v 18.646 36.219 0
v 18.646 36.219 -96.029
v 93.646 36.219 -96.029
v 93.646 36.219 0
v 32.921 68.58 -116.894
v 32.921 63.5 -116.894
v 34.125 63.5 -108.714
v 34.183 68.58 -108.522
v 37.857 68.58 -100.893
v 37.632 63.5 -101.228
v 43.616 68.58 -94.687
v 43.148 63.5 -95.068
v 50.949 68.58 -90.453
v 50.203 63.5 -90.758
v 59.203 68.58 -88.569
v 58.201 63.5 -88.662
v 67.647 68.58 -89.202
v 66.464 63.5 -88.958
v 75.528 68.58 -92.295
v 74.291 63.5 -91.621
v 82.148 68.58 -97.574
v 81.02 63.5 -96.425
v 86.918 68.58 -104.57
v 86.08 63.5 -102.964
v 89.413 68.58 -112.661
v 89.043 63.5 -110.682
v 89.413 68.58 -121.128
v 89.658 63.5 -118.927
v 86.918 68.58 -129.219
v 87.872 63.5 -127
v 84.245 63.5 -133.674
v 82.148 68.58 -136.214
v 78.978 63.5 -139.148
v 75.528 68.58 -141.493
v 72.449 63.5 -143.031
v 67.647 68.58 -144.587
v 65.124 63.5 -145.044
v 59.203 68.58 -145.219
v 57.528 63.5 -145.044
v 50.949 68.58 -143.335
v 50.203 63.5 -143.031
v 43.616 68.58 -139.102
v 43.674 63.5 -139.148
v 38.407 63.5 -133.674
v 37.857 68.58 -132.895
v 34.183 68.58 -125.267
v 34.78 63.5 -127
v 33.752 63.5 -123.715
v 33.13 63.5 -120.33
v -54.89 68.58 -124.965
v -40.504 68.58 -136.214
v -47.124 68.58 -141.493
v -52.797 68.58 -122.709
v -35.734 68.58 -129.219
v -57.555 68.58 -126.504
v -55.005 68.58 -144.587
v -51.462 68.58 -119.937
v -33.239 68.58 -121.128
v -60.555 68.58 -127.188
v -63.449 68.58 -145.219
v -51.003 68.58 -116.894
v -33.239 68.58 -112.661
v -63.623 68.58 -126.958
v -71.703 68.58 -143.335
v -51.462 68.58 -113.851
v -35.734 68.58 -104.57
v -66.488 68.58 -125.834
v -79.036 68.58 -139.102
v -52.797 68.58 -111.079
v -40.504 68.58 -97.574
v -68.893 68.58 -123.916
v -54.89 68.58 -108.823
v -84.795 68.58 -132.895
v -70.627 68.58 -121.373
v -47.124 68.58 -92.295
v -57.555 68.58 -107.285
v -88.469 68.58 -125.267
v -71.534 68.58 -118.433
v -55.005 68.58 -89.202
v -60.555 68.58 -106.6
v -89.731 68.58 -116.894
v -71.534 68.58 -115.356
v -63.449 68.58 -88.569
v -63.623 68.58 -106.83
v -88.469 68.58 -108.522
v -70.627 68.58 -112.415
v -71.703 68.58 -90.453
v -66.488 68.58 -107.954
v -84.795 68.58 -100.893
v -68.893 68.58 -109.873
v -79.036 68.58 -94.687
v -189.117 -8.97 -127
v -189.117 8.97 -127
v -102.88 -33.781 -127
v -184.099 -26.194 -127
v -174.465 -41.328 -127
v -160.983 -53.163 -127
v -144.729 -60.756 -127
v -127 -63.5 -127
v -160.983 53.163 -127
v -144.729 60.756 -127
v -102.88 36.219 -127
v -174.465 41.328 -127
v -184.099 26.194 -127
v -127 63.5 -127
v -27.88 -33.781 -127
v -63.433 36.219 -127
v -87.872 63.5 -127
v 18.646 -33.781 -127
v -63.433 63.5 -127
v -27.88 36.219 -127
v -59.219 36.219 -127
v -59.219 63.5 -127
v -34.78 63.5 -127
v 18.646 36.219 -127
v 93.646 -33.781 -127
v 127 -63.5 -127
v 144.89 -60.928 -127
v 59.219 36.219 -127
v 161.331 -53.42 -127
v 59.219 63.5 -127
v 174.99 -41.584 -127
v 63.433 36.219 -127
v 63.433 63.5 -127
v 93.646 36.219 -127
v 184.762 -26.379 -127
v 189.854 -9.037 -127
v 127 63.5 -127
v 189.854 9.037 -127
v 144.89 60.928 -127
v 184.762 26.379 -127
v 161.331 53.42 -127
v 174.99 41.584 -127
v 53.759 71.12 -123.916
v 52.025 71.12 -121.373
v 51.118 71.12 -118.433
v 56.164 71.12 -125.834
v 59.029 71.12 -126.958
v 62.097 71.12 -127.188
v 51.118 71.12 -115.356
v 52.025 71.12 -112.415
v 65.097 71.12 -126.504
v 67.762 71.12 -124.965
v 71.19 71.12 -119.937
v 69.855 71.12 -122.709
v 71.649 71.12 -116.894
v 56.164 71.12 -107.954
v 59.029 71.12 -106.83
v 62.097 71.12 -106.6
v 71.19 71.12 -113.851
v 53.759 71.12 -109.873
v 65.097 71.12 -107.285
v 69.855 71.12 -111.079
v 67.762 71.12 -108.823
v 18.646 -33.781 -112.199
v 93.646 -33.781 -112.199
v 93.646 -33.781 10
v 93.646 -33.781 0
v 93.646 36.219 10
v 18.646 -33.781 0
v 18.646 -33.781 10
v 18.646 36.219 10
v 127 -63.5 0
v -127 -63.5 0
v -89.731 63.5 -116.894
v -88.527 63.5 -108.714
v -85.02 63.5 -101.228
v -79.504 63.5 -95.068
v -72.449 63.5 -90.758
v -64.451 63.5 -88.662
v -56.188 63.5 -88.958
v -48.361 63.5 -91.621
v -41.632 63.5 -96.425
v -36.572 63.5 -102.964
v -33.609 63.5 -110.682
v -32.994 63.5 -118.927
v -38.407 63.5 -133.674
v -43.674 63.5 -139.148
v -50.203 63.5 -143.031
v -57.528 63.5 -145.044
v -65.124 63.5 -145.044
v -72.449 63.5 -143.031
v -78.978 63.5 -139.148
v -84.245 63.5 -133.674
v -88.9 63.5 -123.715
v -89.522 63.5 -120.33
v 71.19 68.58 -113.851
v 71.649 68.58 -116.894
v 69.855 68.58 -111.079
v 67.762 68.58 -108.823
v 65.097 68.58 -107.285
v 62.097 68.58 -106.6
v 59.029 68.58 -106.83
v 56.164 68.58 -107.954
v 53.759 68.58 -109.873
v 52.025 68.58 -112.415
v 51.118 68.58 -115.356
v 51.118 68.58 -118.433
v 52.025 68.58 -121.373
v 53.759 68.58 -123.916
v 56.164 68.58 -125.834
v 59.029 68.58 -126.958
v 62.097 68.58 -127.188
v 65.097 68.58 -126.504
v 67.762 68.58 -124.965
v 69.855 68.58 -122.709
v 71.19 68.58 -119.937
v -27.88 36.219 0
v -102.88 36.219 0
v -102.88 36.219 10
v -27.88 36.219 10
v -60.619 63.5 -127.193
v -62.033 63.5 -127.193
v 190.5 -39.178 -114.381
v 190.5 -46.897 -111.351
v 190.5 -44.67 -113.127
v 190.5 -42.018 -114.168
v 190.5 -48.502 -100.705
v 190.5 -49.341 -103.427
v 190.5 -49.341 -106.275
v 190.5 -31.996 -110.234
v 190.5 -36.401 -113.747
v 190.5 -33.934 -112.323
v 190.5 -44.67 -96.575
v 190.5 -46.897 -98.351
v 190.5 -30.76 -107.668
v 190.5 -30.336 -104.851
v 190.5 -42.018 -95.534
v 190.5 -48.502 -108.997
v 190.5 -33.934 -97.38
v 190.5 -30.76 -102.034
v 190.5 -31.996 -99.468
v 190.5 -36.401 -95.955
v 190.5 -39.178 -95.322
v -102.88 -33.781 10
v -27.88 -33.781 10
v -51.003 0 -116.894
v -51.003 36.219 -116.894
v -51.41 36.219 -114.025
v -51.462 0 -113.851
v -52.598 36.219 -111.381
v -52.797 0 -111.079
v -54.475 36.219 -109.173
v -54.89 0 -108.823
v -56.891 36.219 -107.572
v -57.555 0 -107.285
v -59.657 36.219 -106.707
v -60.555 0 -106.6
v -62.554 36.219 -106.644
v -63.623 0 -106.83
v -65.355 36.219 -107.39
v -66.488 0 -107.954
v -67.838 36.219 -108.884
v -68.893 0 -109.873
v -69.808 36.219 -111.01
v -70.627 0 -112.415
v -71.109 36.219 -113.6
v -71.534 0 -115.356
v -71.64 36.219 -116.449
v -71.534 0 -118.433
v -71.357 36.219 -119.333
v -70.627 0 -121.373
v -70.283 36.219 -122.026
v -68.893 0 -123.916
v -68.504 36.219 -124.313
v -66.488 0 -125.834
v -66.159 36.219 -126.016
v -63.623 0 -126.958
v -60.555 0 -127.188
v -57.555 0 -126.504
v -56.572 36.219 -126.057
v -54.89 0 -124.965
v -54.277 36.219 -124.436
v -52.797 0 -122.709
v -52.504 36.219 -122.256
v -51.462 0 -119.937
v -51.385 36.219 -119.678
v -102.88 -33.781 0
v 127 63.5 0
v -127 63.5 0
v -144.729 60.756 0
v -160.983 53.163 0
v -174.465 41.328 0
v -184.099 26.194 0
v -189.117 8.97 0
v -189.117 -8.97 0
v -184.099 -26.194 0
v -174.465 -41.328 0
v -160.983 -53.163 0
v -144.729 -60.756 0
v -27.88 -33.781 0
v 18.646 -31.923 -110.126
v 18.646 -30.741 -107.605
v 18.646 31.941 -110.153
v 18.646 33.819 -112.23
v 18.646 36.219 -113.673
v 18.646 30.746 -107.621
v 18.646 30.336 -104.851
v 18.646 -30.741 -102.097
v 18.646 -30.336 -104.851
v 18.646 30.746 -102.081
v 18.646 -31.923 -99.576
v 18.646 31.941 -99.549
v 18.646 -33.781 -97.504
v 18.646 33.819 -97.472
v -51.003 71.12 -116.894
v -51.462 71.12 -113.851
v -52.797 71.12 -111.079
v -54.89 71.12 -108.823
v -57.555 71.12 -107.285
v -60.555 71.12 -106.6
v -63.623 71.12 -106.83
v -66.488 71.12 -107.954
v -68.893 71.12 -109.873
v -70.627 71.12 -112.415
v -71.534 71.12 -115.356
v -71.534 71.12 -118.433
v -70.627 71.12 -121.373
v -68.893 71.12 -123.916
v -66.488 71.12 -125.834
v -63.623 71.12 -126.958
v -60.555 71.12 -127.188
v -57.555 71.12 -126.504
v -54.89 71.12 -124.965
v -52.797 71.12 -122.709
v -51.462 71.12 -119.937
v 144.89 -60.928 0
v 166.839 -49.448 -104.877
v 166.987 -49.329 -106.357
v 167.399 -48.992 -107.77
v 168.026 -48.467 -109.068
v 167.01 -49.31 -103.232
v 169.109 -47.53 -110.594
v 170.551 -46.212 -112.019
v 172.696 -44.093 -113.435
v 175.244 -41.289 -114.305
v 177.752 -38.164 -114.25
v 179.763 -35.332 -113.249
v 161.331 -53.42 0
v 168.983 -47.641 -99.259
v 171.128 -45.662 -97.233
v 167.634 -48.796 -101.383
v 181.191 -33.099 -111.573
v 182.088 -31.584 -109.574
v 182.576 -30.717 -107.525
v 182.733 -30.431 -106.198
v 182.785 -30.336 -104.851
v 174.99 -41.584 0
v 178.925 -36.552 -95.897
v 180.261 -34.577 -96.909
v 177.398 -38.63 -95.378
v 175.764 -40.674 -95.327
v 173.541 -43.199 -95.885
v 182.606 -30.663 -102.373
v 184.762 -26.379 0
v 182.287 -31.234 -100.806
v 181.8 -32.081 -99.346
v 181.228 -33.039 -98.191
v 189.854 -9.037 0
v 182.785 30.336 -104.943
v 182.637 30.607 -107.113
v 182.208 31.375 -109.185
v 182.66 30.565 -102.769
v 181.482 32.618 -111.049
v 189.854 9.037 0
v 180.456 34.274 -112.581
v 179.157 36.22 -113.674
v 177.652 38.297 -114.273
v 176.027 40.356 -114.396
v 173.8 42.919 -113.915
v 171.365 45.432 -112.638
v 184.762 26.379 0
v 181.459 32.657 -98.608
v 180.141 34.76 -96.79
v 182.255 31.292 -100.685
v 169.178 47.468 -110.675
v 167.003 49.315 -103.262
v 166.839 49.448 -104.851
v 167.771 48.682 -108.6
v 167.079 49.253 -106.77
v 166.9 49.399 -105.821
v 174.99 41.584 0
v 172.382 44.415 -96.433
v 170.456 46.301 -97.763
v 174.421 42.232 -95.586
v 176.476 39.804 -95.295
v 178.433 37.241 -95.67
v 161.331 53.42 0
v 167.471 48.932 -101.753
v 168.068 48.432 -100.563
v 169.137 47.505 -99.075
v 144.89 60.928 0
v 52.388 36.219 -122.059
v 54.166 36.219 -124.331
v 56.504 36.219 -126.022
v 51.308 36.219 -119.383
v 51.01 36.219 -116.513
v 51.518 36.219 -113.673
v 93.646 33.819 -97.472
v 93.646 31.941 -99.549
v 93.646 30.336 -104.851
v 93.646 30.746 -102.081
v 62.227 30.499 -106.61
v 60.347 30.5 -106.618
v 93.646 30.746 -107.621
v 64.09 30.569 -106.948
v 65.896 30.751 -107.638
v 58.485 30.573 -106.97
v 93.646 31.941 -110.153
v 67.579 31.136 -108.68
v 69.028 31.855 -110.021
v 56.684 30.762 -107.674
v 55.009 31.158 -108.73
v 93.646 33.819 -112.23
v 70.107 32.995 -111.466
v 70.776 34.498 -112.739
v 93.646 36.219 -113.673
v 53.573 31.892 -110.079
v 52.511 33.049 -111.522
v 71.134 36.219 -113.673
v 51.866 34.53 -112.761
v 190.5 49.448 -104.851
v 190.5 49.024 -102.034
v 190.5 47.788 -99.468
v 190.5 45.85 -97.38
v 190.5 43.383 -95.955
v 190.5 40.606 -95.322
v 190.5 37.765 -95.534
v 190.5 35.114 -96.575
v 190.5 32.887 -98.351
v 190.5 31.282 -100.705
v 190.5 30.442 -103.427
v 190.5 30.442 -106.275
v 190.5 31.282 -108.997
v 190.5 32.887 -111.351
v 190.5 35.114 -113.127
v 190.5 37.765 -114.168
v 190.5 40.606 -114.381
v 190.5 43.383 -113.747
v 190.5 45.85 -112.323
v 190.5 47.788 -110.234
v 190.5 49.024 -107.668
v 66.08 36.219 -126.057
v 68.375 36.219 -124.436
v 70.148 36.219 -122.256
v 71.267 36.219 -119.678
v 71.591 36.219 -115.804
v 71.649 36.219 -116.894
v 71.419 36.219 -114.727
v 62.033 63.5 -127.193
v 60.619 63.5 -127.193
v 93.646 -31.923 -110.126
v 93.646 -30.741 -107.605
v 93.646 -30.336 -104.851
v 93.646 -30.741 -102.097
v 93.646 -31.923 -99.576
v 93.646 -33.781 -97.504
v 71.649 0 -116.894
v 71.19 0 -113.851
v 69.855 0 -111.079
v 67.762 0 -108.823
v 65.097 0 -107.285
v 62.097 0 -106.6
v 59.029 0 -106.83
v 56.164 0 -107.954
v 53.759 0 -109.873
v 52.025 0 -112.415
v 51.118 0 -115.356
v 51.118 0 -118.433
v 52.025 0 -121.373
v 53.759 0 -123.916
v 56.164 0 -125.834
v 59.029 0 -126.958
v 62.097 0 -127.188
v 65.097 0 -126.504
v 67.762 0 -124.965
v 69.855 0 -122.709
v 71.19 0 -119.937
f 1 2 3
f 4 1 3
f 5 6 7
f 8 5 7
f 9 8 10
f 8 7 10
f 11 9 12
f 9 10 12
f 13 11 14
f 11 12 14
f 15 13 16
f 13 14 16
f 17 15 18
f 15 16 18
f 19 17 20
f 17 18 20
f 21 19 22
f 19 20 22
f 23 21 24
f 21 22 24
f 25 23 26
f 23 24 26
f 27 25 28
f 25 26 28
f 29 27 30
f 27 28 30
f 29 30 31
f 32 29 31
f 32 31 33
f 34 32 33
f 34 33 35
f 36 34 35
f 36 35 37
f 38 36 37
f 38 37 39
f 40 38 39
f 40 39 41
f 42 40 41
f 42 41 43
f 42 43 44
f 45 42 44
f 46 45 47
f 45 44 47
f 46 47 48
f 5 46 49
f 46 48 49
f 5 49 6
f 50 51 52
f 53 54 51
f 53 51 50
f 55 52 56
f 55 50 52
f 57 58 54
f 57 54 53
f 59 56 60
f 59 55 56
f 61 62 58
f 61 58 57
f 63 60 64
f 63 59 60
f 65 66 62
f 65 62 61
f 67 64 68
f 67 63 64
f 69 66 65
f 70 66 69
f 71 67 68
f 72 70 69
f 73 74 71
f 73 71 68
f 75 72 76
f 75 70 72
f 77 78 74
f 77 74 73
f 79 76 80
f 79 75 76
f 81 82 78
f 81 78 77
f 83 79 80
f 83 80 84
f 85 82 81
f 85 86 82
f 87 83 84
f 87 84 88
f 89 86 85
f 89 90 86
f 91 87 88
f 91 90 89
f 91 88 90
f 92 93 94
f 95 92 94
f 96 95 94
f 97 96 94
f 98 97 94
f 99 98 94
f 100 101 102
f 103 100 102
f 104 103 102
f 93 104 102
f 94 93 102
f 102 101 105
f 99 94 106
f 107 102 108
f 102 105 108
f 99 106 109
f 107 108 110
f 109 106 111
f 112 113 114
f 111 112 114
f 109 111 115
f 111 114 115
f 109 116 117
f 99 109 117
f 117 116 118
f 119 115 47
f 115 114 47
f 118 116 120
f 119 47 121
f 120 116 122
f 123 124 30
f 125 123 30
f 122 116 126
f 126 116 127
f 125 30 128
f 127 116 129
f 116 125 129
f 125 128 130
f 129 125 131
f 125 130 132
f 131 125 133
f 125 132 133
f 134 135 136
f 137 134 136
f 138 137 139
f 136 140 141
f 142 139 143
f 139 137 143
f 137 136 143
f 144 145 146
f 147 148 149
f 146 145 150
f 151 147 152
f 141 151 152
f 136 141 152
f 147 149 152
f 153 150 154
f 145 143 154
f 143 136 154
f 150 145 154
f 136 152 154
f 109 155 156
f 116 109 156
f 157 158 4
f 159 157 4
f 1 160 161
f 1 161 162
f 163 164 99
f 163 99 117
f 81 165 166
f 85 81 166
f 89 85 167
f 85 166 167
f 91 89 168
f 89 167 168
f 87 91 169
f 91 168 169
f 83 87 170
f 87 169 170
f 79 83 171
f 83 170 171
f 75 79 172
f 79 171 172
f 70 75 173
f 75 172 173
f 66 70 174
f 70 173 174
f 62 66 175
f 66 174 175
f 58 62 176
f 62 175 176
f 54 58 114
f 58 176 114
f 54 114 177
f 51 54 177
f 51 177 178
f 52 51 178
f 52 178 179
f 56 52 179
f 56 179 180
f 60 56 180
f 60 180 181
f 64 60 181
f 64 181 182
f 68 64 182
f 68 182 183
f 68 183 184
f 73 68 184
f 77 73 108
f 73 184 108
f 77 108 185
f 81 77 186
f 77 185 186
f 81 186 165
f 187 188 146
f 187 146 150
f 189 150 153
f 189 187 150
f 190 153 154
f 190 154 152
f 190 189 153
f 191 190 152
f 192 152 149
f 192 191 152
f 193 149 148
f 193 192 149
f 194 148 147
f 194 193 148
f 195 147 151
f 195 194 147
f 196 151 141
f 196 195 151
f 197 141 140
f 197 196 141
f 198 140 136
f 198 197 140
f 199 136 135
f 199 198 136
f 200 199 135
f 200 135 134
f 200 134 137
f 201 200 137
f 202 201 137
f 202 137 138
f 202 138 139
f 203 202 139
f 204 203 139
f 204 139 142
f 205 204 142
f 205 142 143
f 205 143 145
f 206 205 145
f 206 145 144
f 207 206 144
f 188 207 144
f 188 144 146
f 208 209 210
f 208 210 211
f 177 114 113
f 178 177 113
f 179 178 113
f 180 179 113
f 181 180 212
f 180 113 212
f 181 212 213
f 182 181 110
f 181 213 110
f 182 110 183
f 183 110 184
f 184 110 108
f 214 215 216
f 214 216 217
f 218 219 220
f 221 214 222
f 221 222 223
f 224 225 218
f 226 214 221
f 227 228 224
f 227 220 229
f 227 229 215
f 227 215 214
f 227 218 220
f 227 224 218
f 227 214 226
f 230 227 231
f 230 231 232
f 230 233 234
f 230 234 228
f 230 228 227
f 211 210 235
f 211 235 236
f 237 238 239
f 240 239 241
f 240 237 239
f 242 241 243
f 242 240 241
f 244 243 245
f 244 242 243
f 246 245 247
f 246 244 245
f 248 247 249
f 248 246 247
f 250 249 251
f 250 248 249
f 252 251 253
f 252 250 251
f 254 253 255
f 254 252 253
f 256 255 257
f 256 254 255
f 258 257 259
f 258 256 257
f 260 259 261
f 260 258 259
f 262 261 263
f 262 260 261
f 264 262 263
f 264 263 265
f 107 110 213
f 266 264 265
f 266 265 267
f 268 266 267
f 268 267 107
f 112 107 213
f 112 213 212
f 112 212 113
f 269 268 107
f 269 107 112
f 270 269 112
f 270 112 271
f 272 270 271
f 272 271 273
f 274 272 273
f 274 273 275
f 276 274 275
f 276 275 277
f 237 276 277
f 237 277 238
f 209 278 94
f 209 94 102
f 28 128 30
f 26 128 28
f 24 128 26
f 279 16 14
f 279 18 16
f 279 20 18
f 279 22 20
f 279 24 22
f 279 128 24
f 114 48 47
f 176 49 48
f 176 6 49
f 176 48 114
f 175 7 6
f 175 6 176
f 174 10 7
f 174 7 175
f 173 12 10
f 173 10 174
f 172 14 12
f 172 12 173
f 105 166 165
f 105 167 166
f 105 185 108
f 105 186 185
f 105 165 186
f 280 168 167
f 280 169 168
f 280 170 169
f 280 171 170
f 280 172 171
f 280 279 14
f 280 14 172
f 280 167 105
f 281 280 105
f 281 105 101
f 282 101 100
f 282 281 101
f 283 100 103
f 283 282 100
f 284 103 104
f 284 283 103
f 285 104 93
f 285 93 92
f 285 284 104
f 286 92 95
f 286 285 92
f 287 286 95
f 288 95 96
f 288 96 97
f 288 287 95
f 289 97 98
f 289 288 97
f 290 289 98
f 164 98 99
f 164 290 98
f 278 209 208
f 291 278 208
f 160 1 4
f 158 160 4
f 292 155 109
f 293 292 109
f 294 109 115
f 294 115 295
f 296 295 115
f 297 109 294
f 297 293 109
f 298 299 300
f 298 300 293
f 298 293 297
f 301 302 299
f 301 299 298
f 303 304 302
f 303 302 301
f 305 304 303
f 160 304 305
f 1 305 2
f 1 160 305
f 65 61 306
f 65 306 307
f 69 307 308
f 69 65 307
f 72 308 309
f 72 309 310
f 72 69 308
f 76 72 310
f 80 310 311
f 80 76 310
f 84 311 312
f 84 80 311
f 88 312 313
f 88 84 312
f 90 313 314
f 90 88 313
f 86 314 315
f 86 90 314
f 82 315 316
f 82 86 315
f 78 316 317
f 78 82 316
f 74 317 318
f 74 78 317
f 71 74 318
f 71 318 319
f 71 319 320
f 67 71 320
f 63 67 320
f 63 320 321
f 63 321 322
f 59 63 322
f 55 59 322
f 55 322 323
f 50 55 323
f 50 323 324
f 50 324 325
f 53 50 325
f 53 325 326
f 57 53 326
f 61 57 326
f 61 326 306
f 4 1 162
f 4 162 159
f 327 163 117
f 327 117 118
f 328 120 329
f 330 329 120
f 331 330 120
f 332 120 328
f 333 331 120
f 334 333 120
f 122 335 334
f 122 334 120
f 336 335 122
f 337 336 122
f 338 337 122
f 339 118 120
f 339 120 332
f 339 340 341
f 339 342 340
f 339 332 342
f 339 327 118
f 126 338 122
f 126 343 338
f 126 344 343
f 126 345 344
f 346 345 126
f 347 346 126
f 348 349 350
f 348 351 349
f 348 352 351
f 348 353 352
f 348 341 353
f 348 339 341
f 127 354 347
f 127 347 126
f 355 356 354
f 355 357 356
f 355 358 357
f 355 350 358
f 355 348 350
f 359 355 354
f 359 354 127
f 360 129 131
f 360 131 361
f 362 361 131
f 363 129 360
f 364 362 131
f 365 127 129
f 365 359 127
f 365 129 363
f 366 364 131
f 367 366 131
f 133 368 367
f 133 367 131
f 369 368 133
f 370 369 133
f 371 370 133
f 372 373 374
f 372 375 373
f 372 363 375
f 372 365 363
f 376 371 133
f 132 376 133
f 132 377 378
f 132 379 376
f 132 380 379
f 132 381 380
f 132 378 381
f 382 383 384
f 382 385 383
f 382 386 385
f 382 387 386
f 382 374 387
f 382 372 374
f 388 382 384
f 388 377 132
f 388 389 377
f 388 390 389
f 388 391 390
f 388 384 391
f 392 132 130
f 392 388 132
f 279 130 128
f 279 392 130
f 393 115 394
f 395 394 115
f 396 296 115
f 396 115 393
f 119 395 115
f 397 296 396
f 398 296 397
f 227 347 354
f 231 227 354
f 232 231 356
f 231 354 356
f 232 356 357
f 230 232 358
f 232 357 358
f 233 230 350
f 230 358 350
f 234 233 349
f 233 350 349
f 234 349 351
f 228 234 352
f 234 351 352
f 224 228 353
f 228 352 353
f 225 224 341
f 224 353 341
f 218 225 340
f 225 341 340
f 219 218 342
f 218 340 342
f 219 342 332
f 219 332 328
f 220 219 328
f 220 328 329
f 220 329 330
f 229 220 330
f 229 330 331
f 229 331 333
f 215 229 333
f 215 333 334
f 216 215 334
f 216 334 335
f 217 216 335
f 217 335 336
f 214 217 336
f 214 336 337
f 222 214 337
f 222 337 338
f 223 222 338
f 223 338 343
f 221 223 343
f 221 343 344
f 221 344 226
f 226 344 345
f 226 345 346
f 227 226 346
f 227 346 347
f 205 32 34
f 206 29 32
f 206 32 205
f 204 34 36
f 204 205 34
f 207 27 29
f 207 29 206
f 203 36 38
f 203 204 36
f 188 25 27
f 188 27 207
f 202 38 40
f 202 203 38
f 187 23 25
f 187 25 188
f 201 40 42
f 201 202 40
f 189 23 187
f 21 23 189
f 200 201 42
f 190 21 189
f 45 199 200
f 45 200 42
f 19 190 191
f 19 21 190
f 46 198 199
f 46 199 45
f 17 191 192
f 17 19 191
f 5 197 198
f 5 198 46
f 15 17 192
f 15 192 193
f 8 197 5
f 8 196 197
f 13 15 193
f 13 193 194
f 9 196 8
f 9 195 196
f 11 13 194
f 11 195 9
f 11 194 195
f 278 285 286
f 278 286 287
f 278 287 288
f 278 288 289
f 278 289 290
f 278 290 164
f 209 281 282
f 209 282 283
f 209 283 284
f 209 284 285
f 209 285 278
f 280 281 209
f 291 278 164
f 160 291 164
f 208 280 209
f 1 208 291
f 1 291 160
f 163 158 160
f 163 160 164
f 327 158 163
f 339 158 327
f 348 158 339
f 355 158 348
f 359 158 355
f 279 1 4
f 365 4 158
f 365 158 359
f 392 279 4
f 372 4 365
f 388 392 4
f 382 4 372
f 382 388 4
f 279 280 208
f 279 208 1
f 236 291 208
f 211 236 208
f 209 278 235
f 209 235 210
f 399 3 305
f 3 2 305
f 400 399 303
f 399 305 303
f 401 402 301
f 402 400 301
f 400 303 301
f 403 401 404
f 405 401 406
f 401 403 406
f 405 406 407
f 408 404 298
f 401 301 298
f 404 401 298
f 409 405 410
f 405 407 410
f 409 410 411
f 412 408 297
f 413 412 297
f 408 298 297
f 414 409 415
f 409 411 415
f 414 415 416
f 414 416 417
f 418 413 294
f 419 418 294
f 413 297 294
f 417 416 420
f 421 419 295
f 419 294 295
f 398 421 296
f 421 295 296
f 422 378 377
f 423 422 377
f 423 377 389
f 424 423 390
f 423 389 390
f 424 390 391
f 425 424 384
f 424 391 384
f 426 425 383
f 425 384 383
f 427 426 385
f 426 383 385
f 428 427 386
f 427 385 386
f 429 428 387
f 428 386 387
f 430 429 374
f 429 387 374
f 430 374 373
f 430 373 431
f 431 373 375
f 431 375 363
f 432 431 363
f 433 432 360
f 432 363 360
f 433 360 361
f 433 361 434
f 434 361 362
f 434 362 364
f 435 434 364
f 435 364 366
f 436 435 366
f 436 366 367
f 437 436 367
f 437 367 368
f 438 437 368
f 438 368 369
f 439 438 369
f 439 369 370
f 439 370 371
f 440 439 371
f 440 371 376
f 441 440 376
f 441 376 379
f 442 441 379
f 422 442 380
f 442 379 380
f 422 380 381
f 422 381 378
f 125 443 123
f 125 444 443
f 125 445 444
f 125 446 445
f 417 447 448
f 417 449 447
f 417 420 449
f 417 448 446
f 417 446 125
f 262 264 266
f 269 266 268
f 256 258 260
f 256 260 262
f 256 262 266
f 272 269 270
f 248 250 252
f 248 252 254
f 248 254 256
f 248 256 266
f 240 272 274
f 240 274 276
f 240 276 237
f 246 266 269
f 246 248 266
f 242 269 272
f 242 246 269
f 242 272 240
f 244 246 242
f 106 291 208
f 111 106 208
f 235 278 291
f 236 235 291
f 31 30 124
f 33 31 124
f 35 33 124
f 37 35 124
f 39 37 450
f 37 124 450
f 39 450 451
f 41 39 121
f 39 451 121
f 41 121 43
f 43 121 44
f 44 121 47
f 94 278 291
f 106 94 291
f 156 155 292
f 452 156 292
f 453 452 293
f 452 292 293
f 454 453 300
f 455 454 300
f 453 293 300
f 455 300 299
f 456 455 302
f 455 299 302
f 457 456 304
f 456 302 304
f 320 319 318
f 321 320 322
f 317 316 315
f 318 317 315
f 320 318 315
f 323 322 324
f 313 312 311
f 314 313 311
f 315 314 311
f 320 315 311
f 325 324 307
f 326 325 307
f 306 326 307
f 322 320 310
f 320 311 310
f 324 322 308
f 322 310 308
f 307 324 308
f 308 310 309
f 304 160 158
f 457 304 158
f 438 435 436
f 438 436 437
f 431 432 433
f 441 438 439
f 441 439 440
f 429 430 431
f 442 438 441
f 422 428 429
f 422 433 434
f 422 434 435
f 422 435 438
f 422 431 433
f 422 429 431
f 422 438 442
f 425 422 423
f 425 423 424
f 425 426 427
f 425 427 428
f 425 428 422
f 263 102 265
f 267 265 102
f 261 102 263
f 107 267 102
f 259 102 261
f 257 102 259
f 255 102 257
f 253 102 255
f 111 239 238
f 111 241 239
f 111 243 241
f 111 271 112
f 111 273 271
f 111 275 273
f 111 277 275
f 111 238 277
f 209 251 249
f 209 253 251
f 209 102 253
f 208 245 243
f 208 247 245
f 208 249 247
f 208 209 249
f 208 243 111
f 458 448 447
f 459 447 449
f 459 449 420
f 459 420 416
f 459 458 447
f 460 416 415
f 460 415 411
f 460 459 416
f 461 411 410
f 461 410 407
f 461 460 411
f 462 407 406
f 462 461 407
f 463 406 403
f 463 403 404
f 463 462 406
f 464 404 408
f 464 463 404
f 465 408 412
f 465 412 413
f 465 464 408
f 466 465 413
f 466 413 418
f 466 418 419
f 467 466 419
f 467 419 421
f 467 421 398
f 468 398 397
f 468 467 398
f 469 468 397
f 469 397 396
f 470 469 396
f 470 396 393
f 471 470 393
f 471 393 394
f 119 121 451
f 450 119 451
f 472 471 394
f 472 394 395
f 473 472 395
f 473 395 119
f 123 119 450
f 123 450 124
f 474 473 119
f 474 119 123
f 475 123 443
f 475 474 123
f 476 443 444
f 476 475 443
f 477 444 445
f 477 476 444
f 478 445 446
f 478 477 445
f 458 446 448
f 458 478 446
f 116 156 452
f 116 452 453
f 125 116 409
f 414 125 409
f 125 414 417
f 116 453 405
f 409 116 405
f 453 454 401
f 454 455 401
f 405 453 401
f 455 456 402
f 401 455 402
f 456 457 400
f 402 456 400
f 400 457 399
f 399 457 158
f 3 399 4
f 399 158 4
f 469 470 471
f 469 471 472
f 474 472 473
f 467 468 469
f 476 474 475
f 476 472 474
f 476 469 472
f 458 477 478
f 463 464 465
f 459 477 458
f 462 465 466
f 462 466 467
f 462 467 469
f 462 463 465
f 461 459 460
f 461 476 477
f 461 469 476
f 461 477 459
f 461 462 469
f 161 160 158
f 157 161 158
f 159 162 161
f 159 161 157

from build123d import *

# Parameters (mm, degrees)
F0_W     = 75
F0_H     = 70
F1_DEPTH = 10
F2_DEPTH = 10
F3_DEPTH = 127
F4_R     = 9.556276
F5_DEPTH = 190.5
F6_R     = 10.323091
F7_DEPTH = 71.12
F8_R     = 28.4047
F9_DEPTH = 5.08


with BuildPart() as f1:
    # F0 (on Top) → F1 (new body)
    with BuildSketch(Plane.XY):
        with Locations((56.145626, 1.21852)):
            Rectangle(F0_W, F0_H)
    extrude(amount=F1_DEPTH)


with BuildPart() as f2:
    # F0 (on Top) → F2 (new body)
    with BuildSketch(Plane.XY):
        with Locations((-65.379949, 1.21852)):
            Rectangle(F0_W, F0_H)
    extrude(amount=F2_DEPTH)


with BuildPart() as f3:
    # F0 (on Top) → F3 (new body)
    with BuildSketch(Plane.XY):
        with BuildLine():
            ThreePointArc((-127, 63.5), (-189.753339, 0), (-127, -63.5))
            Line((-127, -63.5), (-127, 63.5))
        make_face()
        Polygon((-125.497793, -63.5), (127, -63.5), (127, 63.5), (-125.497793, 63.5), (-127, 63.5), (-127, -63.5), align=None)
        with Locations((-65.379949, 1.21852)):
            Rectangle(F0_W, F0_H, mode=Mode.SUBTRACT)
        with Locations((56.145626, 1.21852)):
            Rectangle(F0_W, F0_H, mode=Mode.SUBTRACT)
        with BuildLine():
            Line((127, 63.5), (127, -63.5))
            ThreePointArc((127, -63.5), (190.5, 0), (127, 63.5))
        make_face()
    extrude(amount=-F3_DEPTH)

    # F4 (on Right) → F5 (join)
    with BuildSketch(Plane.YZ):
        with Locations((39.891906, -104.851119)):
            Circle(F4_R)
        with Locations((-39.891906, -104.851119)):
            Circle(F4_R)
    extrude(amount=F5_DEPTH)

    # F6 (on Front) → F7 (join)
    with BuildSketch(Plane.XZ):
        with Locations((61.326012, -116.8942)):
            Circle(F6_R)
        with Locations((-61.326012, -116.8942)):
            Circle(F6_R)
    extrude(amount=-F7_DEPTH)

    # F8 (on face) → F9 (join)
    with BuildSketch(Plane(origin=(0, 63.5, 0), x_dir=(-1, 0, 0), z_dir=(0, 1, 0))):
        with Locations((-61.326012, -116.8942)):
            Circle(F8_R)
        with Locations((61.326012, -116.8942)):
            Circle(F8_R)
    extrude(amount=F9_DEPTH)


solid = Compound([f1.part, f2.part, f3.part])
